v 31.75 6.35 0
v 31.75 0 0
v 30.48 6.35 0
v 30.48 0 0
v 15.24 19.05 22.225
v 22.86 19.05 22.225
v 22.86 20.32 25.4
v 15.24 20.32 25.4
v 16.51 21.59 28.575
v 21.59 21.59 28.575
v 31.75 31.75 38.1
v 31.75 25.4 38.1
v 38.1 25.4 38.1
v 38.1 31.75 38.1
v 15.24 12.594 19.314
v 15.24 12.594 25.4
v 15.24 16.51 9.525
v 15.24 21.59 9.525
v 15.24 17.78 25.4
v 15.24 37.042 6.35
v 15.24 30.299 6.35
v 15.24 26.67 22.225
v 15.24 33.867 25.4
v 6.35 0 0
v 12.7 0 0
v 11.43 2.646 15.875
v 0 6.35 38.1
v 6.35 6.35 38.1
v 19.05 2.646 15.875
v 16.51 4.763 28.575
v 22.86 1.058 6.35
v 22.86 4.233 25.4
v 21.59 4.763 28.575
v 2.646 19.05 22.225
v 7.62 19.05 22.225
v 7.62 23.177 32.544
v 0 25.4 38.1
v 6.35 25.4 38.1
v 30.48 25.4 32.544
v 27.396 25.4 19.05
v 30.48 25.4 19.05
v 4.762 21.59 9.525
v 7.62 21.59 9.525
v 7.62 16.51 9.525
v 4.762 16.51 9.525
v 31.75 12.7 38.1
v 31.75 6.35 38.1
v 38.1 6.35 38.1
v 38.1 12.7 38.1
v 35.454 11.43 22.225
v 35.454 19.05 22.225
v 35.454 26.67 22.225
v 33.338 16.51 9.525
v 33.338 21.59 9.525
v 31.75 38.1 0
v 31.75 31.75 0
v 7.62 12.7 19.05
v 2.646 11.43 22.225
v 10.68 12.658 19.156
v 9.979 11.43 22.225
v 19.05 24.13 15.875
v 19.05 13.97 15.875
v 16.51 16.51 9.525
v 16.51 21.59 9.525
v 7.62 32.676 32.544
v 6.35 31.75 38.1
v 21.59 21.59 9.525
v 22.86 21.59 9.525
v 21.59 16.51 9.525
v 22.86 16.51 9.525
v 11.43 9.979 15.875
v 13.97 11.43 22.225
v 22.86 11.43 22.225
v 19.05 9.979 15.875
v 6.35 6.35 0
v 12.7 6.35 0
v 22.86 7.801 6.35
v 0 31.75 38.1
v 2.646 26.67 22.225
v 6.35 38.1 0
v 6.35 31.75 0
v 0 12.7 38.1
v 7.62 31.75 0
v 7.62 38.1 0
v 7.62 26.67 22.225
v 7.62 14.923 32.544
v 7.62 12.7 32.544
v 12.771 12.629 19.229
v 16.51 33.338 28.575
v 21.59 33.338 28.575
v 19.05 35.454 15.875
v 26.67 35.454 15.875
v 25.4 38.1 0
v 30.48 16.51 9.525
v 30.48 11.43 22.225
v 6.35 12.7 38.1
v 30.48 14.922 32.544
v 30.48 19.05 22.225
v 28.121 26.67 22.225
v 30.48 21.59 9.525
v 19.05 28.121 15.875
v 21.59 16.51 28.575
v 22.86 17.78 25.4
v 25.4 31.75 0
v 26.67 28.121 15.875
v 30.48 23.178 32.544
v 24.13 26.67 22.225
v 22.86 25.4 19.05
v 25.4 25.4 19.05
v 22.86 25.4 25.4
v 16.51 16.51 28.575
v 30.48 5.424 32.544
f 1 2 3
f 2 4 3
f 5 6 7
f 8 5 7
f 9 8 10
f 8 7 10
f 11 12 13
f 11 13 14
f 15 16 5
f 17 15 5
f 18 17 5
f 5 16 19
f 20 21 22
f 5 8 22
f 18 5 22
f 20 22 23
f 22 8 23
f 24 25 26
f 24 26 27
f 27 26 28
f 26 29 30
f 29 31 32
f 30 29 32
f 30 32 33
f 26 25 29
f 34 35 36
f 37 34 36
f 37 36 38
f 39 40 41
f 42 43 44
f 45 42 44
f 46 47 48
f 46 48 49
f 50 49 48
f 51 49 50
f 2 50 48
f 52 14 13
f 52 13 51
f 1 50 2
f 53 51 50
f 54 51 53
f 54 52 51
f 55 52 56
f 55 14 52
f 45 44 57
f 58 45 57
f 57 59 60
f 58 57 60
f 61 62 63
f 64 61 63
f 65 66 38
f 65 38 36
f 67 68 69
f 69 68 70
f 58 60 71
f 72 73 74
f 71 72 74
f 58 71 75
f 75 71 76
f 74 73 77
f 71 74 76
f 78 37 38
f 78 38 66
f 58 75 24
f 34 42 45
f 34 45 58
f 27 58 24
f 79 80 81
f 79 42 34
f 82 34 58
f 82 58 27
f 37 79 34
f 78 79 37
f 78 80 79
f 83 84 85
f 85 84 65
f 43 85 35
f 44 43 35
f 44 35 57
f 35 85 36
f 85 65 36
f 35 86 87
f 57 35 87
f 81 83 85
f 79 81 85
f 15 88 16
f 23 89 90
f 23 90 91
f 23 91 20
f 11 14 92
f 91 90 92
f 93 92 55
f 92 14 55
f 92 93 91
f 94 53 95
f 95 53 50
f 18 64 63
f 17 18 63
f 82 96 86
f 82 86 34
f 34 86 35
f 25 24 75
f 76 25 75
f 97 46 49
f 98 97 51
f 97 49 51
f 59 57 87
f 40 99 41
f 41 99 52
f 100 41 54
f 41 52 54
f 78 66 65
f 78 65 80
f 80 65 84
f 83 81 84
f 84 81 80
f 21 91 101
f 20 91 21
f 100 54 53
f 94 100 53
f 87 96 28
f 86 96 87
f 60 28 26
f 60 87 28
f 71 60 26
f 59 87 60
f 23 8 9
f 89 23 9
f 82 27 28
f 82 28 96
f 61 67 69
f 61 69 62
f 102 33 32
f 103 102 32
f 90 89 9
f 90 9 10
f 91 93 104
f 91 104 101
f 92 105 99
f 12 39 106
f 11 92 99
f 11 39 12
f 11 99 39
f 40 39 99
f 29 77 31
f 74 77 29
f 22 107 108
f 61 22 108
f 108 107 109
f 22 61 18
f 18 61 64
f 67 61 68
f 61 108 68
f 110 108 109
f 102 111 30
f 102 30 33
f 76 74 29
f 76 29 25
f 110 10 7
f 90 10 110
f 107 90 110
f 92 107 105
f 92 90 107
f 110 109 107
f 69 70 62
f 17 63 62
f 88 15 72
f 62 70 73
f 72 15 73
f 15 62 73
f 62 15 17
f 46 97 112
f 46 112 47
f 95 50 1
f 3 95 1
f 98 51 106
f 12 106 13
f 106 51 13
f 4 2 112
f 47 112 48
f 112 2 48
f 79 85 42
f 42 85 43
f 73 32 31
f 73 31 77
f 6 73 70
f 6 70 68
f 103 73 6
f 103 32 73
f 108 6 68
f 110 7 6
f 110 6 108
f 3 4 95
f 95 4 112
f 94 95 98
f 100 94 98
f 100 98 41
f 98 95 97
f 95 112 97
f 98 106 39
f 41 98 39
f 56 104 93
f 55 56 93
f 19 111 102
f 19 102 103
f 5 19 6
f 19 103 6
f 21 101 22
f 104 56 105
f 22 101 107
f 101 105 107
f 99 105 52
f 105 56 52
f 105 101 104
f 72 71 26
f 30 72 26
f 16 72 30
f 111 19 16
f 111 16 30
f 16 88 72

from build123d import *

# Parameters (mm, degrees)
F0_W      = 38.1
F0_H      = 38.1
F1_DEPTH  = 38.1
F6_DEPTH  = 38.1
F8_DEPTH  = 38.1
F9_W      = 7.62
F9_H      = 25.4
F10_DEPTH = 38.1


with BuildPart() as f1:
    # F0 (on Right) → F1 (new body)
    with BuildSketch(Plane.YZ):
        with Locations((19.05, 19.05)):
            Rectangle(F0_W, F0_H)
    extrude(amount=F1_DEPTH)

    # F5 (on offset) → F6 (cut)
    with BuildSketch(Plane.XZ.offset(-38.1)):
        Polygon((38.1, 0), (38.1, 38.1), (31.75, 0), align=None)
        Polygon((31.75, 38.1), (6.35, 38.1), (11.43, 15.875), (16.51, 28.575), (21.59, 28.575), (26.67, 15.875), align=None)
        Polygon((19.05, 15.875), (12.7, 0), (25.4, 0), align=None)
        Polygon((0, 38.1), (0, 0), (6.35, 0), align=None)
    extrude(amount=F6_DEPTH, mode=Mode.SUBTRACT)

    # F7 (on offset) → F8 (cut)
    with BuildSketch(Plane.YZ.offset(38.1)):
        Polygon((0, 38.1), (0, 0), (6.35, 38.1), align=None)
        Polygon((25.4, 38.1), (12.7, 38.1), (19.05, 22.225), align=None)
        Polygon((31.75, 38.1), (38.1, 0), (38.1, 38.1), align=None)
        Polygon((11.43, 22.225), (6.35, 0), (31.75, 0), (26.67, 22.225), (21.59, 9.525), (16.51, 9.525), align=None)
    extrude(amount=-F8_DEPTH, mode=Mode.SUBTRACT)

    # F9 (on offset) → F10 (cut)
    with BuildSketch(Plane.XY.offset(38.1)):
        with Locations((26.67, 12.7)):
            Rectangle(F9_W, F9_H)
        Polygon((15.24, 38.1), (7.62, 38.1), (7.62, 12.7), (15.24, 12.594295), align=None)
    extrude(amount=-F10_DEPTH, mode=Mode.SUBTRACT)


solid = f1.part
